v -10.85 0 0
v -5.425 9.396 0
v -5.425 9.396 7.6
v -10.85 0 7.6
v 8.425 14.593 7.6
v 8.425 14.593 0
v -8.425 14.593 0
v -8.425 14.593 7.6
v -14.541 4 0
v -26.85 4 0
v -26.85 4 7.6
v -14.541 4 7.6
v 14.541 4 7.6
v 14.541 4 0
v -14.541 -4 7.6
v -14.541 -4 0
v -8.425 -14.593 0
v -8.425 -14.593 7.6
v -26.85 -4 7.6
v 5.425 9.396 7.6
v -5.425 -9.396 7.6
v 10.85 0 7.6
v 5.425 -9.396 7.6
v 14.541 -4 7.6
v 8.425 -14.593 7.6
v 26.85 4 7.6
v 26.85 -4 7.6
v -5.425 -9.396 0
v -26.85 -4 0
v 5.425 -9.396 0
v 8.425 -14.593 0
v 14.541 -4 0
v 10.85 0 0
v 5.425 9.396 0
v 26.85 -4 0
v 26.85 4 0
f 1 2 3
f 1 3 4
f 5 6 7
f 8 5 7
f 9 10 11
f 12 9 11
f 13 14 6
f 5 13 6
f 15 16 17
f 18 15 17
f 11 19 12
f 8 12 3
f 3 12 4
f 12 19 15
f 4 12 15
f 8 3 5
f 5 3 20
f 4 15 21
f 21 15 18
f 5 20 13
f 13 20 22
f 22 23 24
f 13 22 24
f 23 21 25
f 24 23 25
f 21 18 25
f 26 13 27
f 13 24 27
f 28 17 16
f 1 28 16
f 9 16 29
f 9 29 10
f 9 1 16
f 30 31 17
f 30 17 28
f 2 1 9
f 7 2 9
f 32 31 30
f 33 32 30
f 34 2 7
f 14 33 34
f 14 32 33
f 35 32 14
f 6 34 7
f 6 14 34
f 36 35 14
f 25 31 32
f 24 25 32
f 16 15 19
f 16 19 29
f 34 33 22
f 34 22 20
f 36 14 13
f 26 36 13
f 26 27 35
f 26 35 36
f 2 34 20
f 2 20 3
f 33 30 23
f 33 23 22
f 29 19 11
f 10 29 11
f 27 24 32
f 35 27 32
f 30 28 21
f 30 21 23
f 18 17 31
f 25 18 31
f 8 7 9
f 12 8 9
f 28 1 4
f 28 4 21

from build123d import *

# Parameters (mm, degrees)
PAD_DEPTH            = 10
PAD002_DEPTH         = 26.85
POCKET_DEPTH         = 0.001
POCKET_DEPTH_BACK    = -14.001
SKETCH004_W          = 82.61631
SKETCH004_H          = 35.698411
SKETCH004_W_2        = 63.407177
SKETCH004_H_2        = 9.483432
POCKET001_DEPTH      = 14.593528
POCKET001_DEPTH_BACK = -14.593528


with BuildPart() as part:
    # Sketch → Pad (new body)
    with BuildSketch(Plane.XY):
        Polygon((16.85, 0), (8.425, 14.592528), (-8.425, 14.592528), (-16.85, 0), (-8.425, -14.592528), (8.425, -14.592528), align=None)
        Polygon((10.85, 0), (5.425, 9.396376), (-5.425, 9.396376), (-10.85, 0), (-5.425, -9.396376), (5.425, -9.396376), align=None, mode=Mode.SUBTRACT)
    extrude(amount=PAD_DEPTH)

    # Sketch002 → Pad002 (join, symmetric)
    with BuildSketch(Plane.YZ):
        with BuildLine():
            ThreePointArc((4, 10), (0, 14), (-4, 10))
            Line((-4, 10), (-4, 0))
            Line((-4, 0), (4, 0))
            Line((4, 0), (4, 10))
        make_face()
    extrude(amount=PAD002_DEPTH, both=True)

    # Sketch003 → Pocket (cut, two sides)
    with BuildSketch(Plane.XY) as pocket_sk:
        Polygon((10.85, 0), (5.425, 9.396376), (-5.425, 9.396376), (-10.85, 0), (-5.425, -9.396376), (5.425, -9.396376), align=None)
    extrude(amount=-POCKET_DEPTH, mode=Mode.SUBTRACT)
    extrude(pocket_sk.sketch, amount=-POCKET_DEPTH_BACK, mode=Mode.SUBTRACT)

    # Sketch004 → Pocket001 (cut, two sides)
    with BuildSketch(Plane.XZ) as pocket001_sk:
        with Locations((0.841957, 8.089457)):
            Rectangle(SKETCH004_W, SKETCH004_H)
        with Locations((-0.35511, 2.858284)):
            Rectangle(SKETCH004_W_2, SKETCH004_H_2, mode=Mode.SUBTRACT)
    extrude(amount=-POCKET001_DEPTH, mode=Mode.SUBTRACT)
    extrude(pocket001_sk.sketch, amount=-POCKET001_DEPTH_BACK, mode=Mode.SUBTRACT)


solid = part.part
